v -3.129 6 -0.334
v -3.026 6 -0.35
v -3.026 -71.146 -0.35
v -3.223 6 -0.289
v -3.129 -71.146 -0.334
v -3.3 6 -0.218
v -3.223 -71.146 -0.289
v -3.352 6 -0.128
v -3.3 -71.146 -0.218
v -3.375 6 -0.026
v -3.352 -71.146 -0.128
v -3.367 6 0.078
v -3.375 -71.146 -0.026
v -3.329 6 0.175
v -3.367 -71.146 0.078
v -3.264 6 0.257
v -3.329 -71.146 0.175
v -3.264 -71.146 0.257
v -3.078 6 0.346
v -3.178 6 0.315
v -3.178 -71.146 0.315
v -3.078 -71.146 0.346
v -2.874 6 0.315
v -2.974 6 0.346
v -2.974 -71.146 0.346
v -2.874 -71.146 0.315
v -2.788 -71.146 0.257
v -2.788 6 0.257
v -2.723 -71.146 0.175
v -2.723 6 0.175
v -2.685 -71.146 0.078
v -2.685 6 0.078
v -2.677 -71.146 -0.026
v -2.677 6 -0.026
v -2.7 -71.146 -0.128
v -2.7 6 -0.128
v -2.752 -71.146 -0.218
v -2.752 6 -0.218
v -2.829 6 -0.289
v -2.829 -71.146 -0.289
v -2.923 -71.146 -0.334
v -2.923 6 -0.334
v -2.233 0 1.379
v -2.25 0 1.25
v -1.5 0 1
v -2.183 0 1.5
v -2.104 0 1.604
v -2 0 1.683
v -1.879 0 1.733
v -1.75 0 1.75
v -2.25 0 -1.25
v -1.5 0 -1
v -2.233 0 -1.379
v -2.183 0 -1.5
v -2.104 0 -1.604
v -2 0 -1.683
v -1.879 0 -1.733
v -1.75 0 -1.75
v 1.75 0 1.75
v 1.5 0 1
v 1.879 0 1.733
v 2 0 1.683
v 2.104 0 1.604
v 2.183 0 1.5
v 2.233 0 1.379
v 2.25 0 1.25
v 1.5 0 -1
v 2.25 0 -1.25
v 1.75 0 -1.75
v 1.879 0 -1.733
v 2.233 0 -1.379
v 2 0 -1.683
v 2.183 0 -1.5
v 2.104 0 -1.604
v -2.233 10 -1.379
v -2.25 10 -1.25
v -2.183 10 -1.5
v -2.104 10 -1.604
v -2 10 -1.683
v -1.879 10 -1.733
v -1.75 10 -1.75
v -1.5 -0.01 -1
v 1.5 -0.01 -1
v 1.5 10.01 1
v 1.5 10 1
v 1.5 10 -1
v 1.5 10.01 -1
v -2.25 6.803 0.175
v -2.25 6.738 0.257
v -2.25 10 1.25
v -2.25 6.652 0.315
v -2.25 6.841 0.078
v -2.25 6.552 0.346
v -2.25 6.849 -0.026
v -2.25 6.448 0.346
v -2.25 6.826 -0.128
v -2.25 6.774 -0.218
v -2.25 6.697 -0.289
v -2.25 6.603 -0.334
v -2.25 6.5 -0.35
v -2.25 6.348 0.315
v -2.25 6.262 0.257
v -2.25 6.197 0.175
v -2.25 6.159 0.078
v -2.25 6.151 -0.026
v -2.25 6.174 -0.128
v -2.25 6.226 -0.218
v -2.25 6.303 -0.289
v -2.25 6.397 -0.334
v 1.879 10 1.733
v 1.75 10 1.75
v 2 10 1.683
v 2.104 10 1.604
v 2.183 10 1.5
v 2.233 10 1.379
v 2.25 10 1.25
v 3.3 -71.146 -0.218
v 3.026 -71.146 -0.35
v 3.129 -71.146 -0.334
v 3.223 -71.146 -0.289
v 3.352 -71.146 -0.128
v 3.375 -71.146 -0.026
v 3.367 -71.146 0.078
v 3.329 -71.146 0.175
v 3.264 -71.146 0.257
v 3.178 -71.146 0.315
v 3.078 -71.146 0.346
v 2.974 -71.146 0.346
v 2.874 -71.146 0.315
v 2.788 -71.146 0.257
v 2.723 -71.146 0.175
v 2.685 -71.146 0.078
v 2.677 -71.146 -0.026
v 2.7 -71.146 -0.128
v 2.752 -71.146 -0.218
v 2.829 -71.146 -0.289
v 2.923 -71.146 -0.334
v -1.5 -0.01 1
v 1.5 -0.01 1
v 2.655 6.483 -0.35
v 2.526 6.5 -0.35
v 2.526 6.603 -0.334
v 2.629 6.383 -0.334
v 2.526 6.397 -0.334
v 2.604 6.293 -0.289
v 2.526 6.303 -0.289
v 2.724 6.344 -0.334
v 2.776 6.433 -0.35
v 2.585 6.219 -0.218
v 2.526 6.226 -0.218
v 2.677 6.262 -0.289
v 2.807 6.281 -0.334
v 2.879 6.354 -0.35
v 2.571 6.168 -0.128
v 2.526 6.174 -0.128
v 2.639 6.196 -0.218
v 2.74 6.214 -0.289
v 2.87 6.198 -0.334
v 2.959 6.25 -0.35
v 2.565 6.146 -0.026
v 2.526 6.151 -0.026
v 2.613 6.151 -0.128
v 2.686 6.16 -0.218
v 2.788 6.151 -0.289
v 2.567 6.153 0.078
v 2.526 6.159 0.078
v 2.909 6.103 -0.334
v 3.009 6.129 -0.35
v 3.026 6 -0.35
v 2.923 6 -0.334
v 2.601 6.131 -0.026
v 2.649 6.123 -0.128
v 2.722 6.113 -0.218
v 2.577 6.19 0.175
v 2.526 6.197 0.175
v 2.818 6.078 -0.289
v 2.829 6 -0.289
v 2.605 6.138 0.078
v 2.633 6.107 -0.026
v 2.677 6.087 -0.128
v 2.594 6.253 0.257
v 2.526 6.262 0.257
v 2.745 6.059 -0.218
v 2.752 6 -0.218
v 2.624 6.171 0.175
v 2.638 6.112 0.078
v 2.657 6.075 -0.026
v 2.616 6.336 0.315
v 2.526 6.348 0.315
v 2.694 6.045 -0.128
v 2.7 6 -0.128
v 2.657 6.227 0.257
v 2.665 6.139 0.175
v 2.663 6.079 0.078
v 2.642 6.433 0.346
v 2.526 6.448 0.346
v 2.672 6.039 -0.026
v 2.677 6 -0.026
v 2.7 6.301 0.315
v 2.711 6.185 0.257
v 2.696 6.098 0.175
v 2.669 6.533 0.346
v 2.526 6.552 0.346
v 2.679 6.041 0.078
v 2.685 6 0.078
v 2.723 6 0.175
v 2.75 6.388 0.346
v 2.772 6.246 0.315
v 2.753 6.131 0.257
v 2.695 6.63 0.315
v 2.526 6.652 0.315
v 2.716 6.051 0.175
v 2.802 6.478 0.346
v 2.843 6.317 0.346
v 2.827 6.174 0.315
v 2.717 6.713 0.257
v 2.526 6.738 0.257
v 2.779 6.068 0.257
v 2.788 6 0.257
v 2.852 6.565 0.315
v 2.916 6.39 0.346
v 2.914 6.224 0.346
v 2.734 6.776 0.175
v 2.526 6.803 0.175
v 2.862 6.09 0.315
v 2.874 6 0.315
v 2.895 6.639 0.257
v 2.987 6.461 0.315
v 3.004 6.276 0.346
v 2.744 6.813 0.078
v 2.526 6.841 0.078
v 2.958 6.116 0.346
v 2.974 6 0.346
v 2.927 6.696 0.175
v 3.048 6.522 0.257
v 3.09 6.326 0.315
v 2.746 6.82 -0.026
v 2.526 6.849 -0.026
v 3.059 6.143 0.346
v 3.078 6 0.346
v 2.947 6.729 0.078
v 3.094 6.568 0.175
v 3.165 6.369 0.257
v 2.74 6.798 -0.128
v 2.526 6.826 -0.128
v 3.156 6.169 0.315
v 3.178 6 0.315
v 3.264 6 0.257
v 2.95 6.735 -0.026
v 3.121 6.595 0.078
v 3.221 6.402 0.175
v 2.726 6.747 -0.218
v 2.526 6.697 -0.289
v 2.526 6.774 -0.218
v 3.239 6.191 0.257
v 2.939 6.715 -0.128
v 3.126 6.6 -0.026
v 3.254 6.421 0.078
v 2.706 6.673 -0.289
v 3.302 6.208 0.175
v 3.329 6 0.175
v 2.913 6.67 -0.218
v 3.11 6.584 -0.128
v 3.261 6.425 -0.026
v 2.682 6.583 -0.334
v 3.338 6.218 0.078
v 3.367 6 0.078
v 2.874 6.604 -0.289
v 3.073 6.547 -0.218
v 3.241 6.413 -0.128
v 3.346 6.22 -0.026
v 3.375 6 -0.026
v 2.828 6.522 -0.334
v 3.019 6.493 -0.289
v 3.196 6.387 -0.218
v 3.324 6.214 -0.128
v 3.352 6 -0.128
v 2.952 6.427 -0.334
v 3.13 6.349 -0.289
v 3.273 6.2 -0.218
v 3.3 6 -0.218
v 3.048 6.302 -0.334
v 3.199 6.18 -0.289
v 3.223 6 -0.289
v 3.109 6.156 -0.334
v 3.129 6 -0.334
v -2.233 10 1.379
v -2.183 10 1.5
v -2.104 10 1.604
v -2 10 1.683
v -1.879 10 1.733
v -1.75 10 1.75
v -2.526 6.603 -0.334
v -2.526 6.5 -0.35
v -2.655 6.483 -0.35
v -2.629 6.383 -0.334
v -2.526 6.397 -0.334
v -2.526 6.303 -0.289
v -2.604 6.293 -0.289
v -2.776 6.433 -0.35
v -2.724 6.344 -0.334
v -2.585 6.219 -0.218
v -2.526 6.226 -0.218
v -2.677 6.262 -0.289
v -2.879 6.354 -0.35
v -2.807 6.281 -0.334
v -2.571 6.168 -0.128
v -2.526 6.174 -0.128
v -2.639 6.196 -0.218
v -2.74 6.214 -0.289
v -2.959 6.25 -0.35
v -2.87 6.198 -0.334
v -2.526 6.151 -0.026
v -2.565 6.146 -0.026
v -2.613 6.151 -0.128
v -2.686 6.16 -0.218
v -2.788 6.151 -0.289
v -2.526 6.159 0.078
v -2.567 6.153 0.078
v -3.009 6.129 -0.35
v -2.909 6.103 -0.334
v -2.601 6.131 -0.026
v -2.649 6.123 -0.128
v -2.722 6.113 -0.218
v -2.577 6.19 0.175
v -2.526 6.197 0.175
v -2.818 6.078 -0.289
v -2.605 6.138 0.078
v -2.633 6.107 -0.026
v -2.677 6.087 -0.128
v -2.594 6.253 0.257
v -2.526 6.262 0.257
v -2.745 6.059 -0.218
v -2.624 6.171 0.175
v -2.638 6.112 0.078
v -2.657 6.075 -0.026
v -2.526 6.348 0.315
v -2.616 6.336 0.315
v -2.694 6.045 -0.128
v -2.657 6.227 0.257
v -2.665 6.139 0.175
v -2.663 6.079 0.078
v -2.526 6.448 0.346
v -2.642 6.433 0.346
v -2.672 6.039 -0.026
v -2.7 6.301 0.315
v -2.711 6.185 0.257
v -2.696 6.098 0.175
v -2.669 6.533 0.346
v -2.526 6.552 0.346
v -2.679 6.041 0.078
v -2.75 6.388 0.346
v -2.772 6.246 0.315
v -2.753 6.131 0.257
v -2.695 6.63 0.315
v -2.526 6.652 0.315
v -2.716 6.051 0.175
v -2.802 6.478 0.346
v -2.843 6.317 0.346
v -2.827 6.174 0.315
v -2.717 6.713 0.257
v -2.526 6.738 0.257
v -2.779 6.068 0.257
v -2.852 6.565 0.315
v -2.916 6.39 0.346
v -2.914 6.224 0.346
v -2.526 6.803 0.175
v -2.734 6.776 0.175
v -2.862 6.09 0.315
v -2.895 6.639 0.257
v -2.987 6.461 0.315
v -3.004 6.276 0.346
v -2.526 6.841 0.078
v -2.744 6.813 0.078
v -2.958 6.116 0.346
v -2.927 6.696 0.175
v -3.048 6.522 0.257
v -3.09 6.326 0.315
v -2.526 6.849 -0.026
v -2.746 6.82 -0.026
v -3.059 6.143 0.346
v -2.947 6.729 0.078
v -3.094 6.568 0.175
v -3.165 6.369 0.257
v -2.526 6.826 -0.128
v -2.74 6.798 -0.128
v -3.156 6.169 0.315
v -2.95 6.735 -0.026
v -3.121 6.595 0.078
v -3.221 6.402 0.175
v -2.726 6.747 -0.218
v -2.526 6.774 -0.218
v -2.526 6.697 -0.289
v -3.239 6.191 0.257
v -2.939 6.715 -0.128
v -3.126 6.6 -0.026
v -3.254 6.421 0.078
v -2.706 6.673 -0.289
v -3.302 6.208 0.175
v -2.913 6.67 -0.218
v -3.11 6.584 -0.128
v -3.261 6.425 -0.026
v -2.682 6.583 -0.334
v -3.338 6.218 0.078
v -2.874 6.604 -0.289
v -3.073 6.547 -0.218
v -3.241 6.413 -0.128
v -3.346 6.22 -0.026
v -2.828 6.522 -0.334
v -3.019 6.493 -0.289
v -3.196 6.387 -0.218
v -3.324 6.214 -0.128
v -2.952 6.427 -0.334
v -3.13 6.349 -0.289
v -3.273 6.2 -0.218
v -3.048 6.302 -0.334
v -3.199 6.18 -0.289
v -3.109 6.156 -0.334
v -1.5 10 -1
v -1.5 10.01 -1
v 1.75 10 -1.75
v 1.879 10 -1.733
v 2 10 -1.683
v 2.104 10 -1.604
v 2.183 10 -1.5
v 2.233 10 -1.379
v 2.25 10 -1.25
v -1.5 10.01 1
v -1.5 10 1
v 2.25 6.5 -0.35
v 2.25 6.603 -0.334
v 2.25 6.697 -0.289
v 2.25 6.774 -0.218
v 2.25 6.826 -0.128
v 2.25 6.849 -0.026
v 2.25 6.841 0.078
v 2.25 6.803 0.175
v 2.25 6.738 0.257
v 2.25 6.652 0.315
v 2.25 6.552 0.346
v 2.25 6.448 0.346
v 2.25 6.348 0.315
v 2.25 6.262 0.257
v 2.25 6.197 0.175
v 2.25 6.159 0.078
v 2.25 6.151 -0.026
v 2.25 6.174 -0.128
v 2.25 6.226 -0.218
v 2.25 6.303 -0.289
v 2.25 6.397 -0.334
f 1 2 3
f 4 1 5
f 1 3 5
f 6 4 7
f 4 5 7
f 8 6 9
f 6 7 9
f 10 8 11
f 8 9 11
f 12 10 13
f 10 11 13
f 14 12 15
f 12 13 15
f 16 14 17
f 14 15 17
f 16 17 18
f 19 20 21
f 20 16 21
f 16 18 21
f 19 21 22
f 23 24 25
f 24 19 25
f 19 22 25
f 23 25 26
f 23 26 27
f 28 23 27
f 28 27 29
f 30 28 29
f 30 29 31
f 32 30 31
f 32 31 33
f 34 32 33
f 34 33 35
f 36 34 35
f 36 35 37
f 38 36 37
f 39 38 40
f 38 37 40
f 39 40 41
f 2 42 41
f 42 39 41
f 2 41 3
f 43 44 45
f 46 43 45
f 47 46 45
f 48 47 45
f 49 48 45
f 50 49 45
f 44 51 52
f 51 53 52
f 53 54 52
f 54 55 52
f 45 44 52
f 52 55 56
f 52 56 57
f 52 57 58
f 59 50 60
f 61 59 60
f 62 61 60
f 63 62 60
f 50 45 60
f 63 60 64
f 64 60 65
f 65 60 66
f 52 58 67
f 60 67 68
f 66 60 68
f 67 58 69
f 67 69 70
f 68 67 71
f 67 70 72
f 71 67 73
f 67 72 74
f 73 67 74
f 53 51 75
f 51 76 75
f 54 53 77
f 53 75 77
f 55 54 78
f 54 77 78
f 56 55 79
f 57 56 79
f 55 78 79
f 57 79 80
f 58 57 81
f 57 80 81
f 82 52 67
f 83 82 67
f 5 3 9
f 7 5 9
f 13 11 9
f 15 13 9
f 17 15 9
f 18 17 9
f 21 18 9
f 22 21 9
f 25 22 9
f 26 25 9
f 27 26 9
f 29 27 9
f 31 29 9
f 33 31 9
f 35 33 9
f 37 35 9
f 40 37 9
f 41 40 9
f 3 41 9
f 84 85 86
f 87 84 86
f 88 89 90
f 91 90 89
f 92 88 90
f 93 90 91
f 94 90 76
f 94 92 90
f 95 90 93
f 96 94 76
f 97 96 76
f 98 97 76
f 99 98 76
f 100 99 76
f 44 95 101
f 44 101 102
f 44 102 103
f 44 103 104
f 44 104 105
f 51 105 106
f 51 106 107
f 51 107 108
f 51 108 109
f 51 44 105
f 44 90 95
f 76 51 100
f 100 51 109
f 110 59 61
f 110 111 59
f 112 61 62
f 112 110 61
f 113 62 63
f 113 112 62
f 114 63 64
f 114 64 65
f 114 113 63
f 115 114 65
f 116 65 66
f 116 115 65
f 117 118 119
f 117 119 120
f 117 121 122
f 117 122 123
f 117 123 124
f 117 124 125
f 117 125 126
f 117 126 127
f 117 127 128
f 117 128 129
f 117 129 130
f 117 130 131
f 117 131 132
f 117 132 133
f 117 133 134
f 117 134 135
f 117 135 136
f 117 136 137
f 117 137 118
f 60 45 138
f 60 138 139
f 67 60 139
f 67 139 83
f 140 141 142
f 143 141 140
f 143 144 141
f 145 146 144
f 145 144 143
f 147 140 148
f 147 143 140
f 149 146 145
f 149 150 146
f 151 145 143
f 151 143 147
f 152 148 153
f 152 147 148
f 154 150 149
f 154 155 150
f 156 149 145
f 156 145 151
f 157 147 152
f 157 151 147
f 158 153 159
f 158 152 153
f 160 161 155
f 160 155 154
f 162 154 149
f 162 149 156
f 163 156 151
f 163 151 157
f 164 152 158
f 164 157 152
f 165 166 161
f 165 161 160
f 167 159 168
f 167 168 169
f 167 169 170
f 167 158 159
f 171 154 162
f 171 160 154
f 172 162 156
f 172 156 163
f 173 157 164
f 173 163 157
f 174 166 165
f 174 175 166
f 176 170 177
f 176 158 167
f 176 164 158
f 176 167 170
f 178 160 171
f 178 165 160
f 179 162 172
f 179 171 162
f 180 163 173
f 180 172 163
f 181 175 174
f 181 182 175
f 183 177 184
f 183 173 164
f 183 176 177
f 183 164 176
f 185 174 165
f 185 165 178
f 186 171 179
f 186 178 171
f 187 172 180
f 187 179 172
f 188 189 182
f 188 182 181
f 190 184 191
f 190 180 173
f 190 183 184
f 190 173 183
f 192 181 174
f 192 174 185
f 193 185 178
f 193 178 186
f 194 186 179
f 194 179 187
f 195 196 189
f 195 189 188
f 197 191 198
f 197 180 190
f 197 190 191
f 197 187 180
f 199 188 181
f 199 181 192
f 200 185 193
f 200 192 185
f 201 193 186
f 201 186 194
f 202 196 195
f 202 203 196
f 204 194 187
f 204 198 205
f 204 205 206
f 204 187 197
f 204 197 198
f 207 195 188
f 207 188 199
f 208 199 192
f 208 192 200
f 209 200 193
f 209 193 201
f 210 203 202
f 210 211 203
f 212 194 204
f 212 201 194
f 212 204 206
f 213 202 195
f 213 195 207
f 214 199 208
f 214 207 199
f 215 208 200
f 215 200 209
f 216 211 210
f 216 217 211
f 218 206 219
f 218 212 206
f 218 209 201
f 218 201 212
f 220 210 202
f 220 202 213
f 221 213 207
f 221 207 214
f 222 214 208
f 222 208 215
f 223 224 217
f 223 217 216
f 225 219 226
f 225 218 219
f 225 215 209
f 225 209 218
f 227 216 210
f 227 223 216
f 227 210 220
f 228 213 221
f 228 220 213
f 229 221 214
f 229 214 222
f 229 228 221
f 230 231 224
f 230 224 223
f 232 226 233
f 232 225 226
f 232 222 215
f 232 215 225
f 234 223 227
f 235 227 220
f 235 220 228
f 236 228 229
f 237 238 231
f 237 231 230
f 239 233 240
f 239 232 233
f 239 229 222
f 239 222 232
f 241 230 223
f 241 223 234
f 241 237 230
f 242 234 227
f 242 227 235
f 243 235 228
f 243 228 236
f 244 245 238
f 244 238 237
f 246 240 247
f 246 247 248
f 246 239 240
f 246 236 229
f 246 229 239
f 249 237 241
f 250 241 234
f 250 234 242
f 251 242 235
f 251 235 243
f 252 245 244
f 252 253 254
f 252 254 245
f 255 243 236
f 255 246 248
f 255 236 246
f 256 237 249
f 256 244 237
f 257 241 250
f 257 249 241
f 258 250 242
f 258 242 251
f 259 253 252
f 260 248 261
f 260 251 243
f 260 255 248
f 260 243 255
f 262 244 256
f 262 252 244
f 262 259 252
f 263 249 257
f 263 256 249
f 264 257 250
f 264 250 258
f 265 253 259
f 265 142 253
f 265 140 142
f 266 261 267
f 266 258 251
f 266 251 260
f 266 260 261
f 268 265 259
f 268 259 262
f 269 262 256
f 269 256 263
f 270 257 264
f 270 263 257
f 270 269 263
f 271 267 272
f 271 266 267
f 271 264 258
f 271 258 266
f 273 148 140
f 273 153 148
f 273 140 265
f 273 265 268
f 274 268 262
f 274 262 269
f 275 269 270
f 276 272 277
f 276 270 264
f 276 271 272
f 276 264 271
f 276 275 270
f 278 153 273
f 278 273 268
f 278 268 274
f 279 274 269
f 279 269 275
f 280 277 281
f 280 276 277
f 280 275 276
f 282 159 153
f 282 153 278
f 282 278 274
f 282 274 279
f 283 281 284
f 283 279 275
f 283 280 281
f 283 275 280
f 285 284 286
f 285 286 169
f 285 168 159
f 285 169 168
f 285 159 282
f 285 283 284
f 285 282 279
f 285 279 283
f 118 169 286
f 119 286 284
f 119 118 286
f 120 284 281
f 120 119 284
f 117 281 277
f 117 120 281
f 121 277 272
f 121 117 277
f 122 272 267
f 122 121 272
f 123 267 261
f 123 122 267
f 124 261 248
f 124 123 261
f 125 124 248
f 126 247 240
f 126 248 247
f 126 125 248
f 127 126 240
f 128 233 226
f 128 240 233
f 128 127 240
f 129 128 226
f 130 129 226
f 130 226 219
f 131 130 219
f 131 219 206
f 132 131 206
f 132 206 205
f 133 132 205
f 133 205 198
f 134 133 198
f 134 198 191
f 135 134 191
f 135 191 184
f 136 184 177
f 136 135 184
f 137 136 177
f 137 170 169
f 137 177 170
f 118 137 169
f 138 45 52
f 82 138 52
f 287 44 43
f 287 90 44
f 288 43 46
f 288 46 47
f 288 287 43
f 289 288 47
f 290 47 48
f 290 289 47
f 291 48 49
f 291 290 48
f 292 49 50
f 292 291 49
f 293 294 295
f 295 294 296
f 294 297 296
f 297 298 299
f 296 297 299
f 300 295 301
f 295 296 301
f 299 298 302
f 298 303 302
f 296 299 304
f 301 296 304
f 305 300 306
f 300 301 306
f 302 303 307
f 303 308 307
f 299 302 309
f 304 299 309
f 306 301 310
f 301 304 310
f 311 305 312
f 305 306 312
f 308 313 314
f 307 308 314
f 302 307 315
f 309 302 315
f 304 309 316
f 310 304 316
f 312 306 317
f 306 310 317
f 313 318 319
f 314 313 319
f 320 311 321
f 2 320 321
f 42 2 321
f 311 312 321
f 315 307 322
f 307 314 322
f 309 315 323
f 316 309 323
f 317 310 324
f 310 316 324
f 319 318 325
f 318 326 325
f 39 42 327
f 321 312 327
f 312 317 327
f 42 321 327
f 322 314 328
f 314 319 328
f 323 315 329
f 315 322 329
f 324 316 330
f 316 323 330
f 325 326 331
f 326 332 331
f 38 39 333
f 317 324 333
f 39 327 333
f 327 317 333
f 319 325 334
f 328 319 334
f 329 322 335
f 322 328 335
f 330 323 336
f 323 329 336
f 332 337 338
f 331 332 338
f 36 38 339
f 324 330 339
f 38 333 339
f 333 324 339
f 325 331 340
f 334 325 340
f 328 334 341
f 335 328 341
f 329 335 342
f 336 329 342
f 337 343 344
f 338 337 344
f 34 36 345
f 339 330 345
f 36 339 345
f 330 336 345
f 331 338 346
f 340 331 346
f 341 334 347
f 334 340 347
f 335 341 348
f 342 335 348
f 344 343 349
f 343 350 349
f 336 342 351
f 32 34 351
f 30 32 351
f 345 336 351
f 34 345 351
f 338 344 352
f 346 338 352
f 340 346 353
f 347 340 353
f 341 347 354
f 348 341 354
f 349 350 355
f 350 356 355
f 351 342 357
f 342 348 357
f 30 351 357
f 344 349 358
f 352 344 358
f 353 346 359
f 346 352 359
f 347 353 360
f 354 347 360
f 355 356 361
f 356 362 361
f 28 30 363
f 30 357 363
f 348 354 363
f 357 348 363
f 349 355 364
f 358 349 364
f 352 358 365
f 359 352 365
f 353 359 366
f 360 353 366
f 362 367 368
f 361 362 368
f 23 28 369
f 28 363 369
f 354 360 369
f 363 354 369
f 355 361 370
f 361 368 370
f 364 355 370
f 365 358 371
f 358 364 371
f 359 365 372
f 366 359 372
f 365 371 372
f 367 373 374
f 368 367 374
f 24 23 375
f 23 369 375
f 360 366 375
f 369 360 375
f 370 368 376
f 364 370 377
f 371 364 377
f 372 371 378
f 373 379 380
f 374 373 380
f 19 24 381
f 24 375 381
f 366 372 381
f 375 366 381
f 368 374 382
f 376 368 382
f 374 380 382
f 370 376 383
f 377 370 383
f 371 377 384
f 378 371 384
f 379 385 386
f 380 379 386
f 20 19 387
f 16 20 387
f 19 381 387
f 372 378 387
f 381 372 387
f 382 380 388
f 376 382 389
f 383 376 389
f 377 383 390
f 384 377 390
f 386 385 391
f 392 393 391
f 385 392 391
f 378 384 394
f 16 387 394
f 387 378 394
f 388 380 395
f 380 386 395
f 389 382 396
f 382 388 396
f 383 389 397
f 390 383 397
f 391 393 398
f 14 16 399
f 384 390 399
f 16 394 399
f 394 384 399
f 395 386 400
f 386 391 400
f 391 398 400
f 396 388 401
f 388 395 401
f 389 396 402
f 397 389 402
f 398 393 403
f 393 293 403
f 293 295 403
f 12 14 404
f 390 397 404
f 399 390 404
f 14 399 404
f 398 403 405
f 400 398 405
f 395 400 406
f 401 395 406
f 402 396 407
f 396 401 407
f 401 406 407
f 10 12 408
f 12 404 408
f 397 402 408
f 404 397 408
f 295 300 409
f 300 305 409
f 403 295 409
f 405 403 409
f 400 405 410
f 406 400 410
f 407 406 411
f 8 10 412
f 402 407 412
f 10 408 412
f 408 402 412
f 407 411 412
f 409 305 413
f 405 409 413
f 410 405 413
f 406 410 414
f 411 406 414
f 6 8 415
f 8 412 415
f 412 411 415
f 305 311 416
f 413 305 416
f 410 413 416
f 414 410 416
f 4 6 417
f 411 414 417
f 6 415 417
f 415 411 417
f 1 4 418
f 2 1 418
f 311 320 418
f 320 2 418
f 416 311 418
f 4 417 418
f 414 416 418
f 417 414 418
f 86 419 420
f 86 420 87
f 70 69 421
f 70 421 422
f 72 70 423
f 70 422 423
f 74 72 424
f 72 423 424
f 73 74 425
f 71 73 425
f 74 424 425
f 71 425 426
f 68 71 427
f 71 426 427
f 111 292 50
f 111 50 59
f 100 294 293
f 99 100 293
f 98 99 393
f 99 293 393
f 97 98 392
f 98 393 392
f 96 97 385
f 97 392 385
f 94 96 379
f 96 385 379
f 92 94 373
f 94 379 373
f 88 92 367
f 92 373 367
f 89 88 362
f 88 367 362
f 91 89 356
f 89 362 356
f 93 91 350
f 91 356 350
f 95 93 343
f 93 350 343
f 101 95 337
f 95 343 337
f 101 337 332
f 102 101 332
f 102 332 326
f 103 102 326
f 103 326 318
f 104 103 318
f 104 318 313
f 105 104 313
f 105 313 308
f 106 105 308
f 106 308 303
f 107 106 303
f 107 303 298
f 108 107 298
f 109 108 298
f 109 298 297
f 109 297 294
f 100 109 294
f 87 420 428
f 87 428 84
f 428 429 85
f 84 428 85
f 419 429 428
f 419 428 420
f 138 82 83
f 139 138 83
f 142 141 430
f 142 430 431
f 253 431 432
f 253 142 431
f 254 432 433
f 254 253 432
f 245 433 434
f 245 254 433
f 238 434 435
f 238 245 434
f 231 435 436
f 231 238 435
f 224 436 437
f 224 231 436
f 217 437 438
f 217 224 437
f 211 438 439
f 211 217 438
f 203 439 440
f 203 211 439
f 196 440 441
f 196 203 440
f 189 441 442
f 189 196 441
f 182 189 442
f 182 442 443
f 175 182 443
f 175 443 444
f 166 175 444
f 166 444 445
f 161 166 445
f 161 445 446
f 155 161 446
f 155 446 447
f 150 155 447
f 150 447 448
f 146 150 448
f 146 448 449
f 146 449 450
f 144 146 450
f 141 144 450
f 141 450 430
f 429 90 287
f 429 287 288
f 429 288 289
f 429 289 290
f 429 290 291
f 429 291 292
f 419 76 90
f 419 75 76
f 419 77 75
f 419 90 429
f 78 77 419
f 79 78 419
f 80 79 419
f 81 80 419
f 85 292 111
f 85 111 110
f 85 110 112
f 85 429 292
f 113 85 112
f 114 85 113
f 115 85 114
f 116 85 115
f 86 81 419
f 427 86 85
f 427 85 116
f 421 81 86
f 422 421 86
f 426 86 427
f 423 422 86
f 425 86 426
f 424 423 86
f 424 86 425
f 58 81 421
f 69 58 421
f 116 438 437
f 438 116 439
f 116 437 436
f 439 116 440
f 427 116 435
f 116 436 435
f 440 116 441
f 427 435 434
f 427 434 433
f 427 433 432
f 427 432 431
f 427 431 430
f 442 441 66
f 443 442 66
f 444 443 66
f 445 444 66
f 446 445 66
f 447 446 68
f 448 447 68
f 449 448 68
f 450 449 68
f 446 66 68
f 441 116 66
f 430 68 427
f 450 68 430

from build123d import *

# Parameters (mm, degrees)
SKETCH1_W                = 4.5
SKETCH1_H                = 3.5
BOSS_EXTRUDE1_DEPTH      = 10
SKETCH2_W                = 3
SKETCH2_H                = 2
BOSS_EXTRUDE2_DEPTH      = 10.01
BOSS_EXTRUDE2_DEPTH_BACK = 0.01
FILLET2_R                = 0.5
SKETCH14_R               = 0.35


with BuildPart() as part:
    # Sketch1 → Boss-Extrude1 (new body)
    with BuildSketch(Plane(origin=(0, 0, 0), x_dir=(1, 0, 0), z_dir=(0, 1, 0))):
        Rectangle(SKETCH1_W, SKETCH1_H)
    extrude(amount=BOSS_EXTRUDE1_DEPTH)

    # Sketch2 → Boss-Extrude2 (add, two sides)
    with BuildSketch(Plane(origin=(0, 0, 0), x_dir=(1, 0, 0), z_dir=(0, 1, 0))) as boss_extrude2_sk:
        Rectangle(SKETCH2_W, SKETCH2_H)
    extrude(amount=BOSS_EXTRUDE2_DEPTH)
    extrude(boss_extrude2_sk.sketch, amount=-BOSS_EXTRUDE2_DEPTH_BACK)

    # Fillet2
    fillet2_edges = [part.edges().sort_by_distance(p)[0] for p in [
        (2.25, 5, 1.75),
        (-2.25, 5, 1.75),
        (-2.25, 5, -1.75),
        (2.25, 5, -1.75),
    ]]
    fillet(fillet2_edges, radius=FILLET2_R)

    # Sweep1: sweep along a path in Sketch15
    with BuildLine(Plane.XY) as sweep1_path:
        Line((2.25, 6.5), (2.3, 6.5))
        Line((2.3, 6.5), (2.525918375, 6.5))
        ThreePointArc((2.525918375, 6.5), (2.879471766, 6.353553391), (3.025918375, 6))
        Line((3.025918375, 6), (3.025918375, -71.146217922))
    # Sketch14 → Sweep1 (sweep)
    with BuildSketch(Plane(origin=(2.25, 0, 0), x_dir=(0, 0, -1), z_dir=(1, 0, 0))):
        with Locations((0, 6.5)):
            Circle(SKETCH14_R)
    sweep1 = sweep(path=sweep1_path.line)

    # Mirror1: Sweep1 across plane
    add(sweep1.mirror(Plane(origin=(0, 0, 0), x_dir=(0, 0, 1), z_dir=(1, 0, 0))))


solid = part.part
